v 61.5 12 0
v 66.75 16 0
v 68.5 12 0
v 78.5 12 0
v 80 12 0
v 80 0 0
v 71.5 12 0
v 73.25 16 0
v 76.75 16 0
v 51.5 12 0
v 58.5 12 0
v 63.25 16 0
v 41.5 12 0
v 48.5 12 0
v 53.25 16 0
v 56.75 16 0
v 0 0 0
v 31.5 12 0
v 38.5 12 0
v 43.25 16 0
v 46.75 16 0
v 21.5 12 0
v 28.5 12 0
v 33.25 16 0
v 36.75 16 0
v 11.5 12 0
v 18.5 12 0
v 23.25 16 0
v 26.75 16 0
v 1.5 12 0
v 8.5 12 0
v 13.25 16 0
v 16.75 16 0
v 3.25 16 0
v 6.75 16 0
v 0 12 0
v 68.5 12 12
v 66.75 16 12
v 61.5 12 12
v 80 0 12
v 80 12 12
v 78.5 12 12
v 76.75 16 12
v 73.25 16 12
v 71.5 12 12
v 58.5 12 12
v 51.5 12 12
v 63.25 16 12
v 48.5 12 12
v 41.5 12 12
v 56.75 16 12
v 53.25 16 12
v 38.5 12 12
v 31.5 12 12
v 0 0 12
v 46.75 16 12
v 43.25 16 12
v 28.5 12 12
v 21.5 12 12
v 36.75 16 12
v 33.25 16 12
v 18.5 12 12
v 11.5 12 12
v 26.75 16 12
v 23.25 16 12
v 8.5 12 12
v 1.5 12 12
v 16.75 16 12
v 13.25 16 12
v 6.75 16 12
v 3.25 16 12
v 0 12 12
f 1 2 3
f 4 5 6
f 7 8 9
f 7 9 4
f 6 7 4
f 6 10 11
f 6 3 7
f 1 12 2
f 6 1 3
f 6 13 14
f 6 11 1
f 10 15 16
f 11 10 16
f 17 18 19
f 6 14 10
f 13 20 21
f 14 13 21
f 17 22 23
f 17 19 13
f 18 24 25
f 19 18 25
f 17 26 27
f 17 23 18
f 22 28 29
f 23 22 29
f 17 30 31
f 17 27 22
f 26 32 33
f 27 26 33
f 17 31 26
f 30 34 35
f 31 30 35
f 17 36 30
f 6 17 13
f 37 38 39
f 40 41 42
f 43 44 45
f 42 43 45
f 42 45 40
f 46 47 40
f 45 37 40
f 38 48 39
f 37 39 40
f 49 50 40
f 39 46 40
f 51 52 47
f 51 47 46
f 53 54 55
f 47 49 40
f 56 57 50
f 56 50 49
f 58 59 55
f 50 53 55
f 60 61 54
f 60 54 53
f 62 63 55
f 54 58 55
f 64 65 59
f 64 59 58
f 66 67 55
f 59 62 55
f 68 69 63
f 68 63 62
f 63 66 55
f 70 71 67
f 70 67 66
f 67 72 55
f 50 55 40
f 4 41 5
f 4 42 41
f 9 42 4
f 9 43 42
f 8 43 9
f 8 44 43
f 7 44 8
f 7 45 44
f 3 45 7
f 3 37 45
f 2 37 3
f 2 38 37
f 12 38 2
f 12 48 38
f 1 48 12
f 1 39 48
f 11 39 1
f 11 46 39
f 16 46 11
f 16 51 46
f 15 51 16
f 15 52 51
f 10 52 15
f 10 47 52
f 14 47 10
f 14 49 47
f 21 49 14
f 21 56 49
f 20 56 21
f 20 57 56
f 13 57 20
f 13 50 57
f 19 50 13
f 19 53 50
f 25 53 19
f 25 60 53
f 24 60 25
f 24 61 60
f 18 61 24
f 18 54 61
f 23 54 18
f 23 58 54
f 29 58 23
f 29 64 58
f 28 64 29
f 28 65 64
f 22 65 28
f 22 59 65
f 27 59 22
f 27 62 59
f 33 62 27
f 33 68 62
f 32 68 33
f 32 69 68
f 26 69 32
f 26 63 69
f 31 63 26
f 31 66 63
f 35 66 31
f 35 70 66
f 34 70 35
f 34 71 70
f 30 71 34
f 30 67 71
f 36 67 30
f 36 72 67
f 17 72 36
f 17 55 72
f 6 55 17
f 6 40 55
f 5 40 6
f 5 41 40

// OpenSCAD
$fn = 32;

// ----------------------------------------------------------------------
// Gear rack: 8 teeth, pitch 10 mm
// ----------------------------------------------------------------------

// --- parameters (mm) ---
teeth = 8;                // number of teeth
pitch = 10;               // tooth pitch, X
root_w = 7;               // tooth width at the root
tip_w = 3.5;              // tooth width at the tip
base_h = 12;              // rack body height, Y
tooth_h = 4;              // tooth height above the body
plate_t = 12;             // rack width, Z (extrusion height)
fit_tol = 0.05;           // declared fit tolerance (prompt contract)
free_tol = 0.2;           // declared free tolerance (prompt contract)

rack_l = teeth * pitch;  // overall length
total_h = base_h + tooth_h;  // overall height

profile = [[0, 0], [80, 0], [80, 12], [78.5, 12], [76.75, 16], [73.25, 16], [71.5, 12], [68.5, 12], [66.75, 16], [63.25, 16], [61.5, 12], [58.5, 12], [56.75, 16], [53.25, 16], [51.5, 12], [48.5, 12], [46.75, 16], [43.25, 16], [41.5, 12], [38.5, 12], [36.75, 16], [33.25, 16], [31.5, 12], [28.5, 12], [26.75, 16], [23.25, 16], [21.5, 12], [18.5, 12], [16.75, 16], [13.25, 16], [11.5, 12], [8.5, 12], [6.75, 16], [3.25, 16], [1.5, 12], [0, 12]];  // primary outline, 36 points, counter clockwise

// --- the one profile operation ---
linear_extrude(height = plate_t) polygon(points = profile);
